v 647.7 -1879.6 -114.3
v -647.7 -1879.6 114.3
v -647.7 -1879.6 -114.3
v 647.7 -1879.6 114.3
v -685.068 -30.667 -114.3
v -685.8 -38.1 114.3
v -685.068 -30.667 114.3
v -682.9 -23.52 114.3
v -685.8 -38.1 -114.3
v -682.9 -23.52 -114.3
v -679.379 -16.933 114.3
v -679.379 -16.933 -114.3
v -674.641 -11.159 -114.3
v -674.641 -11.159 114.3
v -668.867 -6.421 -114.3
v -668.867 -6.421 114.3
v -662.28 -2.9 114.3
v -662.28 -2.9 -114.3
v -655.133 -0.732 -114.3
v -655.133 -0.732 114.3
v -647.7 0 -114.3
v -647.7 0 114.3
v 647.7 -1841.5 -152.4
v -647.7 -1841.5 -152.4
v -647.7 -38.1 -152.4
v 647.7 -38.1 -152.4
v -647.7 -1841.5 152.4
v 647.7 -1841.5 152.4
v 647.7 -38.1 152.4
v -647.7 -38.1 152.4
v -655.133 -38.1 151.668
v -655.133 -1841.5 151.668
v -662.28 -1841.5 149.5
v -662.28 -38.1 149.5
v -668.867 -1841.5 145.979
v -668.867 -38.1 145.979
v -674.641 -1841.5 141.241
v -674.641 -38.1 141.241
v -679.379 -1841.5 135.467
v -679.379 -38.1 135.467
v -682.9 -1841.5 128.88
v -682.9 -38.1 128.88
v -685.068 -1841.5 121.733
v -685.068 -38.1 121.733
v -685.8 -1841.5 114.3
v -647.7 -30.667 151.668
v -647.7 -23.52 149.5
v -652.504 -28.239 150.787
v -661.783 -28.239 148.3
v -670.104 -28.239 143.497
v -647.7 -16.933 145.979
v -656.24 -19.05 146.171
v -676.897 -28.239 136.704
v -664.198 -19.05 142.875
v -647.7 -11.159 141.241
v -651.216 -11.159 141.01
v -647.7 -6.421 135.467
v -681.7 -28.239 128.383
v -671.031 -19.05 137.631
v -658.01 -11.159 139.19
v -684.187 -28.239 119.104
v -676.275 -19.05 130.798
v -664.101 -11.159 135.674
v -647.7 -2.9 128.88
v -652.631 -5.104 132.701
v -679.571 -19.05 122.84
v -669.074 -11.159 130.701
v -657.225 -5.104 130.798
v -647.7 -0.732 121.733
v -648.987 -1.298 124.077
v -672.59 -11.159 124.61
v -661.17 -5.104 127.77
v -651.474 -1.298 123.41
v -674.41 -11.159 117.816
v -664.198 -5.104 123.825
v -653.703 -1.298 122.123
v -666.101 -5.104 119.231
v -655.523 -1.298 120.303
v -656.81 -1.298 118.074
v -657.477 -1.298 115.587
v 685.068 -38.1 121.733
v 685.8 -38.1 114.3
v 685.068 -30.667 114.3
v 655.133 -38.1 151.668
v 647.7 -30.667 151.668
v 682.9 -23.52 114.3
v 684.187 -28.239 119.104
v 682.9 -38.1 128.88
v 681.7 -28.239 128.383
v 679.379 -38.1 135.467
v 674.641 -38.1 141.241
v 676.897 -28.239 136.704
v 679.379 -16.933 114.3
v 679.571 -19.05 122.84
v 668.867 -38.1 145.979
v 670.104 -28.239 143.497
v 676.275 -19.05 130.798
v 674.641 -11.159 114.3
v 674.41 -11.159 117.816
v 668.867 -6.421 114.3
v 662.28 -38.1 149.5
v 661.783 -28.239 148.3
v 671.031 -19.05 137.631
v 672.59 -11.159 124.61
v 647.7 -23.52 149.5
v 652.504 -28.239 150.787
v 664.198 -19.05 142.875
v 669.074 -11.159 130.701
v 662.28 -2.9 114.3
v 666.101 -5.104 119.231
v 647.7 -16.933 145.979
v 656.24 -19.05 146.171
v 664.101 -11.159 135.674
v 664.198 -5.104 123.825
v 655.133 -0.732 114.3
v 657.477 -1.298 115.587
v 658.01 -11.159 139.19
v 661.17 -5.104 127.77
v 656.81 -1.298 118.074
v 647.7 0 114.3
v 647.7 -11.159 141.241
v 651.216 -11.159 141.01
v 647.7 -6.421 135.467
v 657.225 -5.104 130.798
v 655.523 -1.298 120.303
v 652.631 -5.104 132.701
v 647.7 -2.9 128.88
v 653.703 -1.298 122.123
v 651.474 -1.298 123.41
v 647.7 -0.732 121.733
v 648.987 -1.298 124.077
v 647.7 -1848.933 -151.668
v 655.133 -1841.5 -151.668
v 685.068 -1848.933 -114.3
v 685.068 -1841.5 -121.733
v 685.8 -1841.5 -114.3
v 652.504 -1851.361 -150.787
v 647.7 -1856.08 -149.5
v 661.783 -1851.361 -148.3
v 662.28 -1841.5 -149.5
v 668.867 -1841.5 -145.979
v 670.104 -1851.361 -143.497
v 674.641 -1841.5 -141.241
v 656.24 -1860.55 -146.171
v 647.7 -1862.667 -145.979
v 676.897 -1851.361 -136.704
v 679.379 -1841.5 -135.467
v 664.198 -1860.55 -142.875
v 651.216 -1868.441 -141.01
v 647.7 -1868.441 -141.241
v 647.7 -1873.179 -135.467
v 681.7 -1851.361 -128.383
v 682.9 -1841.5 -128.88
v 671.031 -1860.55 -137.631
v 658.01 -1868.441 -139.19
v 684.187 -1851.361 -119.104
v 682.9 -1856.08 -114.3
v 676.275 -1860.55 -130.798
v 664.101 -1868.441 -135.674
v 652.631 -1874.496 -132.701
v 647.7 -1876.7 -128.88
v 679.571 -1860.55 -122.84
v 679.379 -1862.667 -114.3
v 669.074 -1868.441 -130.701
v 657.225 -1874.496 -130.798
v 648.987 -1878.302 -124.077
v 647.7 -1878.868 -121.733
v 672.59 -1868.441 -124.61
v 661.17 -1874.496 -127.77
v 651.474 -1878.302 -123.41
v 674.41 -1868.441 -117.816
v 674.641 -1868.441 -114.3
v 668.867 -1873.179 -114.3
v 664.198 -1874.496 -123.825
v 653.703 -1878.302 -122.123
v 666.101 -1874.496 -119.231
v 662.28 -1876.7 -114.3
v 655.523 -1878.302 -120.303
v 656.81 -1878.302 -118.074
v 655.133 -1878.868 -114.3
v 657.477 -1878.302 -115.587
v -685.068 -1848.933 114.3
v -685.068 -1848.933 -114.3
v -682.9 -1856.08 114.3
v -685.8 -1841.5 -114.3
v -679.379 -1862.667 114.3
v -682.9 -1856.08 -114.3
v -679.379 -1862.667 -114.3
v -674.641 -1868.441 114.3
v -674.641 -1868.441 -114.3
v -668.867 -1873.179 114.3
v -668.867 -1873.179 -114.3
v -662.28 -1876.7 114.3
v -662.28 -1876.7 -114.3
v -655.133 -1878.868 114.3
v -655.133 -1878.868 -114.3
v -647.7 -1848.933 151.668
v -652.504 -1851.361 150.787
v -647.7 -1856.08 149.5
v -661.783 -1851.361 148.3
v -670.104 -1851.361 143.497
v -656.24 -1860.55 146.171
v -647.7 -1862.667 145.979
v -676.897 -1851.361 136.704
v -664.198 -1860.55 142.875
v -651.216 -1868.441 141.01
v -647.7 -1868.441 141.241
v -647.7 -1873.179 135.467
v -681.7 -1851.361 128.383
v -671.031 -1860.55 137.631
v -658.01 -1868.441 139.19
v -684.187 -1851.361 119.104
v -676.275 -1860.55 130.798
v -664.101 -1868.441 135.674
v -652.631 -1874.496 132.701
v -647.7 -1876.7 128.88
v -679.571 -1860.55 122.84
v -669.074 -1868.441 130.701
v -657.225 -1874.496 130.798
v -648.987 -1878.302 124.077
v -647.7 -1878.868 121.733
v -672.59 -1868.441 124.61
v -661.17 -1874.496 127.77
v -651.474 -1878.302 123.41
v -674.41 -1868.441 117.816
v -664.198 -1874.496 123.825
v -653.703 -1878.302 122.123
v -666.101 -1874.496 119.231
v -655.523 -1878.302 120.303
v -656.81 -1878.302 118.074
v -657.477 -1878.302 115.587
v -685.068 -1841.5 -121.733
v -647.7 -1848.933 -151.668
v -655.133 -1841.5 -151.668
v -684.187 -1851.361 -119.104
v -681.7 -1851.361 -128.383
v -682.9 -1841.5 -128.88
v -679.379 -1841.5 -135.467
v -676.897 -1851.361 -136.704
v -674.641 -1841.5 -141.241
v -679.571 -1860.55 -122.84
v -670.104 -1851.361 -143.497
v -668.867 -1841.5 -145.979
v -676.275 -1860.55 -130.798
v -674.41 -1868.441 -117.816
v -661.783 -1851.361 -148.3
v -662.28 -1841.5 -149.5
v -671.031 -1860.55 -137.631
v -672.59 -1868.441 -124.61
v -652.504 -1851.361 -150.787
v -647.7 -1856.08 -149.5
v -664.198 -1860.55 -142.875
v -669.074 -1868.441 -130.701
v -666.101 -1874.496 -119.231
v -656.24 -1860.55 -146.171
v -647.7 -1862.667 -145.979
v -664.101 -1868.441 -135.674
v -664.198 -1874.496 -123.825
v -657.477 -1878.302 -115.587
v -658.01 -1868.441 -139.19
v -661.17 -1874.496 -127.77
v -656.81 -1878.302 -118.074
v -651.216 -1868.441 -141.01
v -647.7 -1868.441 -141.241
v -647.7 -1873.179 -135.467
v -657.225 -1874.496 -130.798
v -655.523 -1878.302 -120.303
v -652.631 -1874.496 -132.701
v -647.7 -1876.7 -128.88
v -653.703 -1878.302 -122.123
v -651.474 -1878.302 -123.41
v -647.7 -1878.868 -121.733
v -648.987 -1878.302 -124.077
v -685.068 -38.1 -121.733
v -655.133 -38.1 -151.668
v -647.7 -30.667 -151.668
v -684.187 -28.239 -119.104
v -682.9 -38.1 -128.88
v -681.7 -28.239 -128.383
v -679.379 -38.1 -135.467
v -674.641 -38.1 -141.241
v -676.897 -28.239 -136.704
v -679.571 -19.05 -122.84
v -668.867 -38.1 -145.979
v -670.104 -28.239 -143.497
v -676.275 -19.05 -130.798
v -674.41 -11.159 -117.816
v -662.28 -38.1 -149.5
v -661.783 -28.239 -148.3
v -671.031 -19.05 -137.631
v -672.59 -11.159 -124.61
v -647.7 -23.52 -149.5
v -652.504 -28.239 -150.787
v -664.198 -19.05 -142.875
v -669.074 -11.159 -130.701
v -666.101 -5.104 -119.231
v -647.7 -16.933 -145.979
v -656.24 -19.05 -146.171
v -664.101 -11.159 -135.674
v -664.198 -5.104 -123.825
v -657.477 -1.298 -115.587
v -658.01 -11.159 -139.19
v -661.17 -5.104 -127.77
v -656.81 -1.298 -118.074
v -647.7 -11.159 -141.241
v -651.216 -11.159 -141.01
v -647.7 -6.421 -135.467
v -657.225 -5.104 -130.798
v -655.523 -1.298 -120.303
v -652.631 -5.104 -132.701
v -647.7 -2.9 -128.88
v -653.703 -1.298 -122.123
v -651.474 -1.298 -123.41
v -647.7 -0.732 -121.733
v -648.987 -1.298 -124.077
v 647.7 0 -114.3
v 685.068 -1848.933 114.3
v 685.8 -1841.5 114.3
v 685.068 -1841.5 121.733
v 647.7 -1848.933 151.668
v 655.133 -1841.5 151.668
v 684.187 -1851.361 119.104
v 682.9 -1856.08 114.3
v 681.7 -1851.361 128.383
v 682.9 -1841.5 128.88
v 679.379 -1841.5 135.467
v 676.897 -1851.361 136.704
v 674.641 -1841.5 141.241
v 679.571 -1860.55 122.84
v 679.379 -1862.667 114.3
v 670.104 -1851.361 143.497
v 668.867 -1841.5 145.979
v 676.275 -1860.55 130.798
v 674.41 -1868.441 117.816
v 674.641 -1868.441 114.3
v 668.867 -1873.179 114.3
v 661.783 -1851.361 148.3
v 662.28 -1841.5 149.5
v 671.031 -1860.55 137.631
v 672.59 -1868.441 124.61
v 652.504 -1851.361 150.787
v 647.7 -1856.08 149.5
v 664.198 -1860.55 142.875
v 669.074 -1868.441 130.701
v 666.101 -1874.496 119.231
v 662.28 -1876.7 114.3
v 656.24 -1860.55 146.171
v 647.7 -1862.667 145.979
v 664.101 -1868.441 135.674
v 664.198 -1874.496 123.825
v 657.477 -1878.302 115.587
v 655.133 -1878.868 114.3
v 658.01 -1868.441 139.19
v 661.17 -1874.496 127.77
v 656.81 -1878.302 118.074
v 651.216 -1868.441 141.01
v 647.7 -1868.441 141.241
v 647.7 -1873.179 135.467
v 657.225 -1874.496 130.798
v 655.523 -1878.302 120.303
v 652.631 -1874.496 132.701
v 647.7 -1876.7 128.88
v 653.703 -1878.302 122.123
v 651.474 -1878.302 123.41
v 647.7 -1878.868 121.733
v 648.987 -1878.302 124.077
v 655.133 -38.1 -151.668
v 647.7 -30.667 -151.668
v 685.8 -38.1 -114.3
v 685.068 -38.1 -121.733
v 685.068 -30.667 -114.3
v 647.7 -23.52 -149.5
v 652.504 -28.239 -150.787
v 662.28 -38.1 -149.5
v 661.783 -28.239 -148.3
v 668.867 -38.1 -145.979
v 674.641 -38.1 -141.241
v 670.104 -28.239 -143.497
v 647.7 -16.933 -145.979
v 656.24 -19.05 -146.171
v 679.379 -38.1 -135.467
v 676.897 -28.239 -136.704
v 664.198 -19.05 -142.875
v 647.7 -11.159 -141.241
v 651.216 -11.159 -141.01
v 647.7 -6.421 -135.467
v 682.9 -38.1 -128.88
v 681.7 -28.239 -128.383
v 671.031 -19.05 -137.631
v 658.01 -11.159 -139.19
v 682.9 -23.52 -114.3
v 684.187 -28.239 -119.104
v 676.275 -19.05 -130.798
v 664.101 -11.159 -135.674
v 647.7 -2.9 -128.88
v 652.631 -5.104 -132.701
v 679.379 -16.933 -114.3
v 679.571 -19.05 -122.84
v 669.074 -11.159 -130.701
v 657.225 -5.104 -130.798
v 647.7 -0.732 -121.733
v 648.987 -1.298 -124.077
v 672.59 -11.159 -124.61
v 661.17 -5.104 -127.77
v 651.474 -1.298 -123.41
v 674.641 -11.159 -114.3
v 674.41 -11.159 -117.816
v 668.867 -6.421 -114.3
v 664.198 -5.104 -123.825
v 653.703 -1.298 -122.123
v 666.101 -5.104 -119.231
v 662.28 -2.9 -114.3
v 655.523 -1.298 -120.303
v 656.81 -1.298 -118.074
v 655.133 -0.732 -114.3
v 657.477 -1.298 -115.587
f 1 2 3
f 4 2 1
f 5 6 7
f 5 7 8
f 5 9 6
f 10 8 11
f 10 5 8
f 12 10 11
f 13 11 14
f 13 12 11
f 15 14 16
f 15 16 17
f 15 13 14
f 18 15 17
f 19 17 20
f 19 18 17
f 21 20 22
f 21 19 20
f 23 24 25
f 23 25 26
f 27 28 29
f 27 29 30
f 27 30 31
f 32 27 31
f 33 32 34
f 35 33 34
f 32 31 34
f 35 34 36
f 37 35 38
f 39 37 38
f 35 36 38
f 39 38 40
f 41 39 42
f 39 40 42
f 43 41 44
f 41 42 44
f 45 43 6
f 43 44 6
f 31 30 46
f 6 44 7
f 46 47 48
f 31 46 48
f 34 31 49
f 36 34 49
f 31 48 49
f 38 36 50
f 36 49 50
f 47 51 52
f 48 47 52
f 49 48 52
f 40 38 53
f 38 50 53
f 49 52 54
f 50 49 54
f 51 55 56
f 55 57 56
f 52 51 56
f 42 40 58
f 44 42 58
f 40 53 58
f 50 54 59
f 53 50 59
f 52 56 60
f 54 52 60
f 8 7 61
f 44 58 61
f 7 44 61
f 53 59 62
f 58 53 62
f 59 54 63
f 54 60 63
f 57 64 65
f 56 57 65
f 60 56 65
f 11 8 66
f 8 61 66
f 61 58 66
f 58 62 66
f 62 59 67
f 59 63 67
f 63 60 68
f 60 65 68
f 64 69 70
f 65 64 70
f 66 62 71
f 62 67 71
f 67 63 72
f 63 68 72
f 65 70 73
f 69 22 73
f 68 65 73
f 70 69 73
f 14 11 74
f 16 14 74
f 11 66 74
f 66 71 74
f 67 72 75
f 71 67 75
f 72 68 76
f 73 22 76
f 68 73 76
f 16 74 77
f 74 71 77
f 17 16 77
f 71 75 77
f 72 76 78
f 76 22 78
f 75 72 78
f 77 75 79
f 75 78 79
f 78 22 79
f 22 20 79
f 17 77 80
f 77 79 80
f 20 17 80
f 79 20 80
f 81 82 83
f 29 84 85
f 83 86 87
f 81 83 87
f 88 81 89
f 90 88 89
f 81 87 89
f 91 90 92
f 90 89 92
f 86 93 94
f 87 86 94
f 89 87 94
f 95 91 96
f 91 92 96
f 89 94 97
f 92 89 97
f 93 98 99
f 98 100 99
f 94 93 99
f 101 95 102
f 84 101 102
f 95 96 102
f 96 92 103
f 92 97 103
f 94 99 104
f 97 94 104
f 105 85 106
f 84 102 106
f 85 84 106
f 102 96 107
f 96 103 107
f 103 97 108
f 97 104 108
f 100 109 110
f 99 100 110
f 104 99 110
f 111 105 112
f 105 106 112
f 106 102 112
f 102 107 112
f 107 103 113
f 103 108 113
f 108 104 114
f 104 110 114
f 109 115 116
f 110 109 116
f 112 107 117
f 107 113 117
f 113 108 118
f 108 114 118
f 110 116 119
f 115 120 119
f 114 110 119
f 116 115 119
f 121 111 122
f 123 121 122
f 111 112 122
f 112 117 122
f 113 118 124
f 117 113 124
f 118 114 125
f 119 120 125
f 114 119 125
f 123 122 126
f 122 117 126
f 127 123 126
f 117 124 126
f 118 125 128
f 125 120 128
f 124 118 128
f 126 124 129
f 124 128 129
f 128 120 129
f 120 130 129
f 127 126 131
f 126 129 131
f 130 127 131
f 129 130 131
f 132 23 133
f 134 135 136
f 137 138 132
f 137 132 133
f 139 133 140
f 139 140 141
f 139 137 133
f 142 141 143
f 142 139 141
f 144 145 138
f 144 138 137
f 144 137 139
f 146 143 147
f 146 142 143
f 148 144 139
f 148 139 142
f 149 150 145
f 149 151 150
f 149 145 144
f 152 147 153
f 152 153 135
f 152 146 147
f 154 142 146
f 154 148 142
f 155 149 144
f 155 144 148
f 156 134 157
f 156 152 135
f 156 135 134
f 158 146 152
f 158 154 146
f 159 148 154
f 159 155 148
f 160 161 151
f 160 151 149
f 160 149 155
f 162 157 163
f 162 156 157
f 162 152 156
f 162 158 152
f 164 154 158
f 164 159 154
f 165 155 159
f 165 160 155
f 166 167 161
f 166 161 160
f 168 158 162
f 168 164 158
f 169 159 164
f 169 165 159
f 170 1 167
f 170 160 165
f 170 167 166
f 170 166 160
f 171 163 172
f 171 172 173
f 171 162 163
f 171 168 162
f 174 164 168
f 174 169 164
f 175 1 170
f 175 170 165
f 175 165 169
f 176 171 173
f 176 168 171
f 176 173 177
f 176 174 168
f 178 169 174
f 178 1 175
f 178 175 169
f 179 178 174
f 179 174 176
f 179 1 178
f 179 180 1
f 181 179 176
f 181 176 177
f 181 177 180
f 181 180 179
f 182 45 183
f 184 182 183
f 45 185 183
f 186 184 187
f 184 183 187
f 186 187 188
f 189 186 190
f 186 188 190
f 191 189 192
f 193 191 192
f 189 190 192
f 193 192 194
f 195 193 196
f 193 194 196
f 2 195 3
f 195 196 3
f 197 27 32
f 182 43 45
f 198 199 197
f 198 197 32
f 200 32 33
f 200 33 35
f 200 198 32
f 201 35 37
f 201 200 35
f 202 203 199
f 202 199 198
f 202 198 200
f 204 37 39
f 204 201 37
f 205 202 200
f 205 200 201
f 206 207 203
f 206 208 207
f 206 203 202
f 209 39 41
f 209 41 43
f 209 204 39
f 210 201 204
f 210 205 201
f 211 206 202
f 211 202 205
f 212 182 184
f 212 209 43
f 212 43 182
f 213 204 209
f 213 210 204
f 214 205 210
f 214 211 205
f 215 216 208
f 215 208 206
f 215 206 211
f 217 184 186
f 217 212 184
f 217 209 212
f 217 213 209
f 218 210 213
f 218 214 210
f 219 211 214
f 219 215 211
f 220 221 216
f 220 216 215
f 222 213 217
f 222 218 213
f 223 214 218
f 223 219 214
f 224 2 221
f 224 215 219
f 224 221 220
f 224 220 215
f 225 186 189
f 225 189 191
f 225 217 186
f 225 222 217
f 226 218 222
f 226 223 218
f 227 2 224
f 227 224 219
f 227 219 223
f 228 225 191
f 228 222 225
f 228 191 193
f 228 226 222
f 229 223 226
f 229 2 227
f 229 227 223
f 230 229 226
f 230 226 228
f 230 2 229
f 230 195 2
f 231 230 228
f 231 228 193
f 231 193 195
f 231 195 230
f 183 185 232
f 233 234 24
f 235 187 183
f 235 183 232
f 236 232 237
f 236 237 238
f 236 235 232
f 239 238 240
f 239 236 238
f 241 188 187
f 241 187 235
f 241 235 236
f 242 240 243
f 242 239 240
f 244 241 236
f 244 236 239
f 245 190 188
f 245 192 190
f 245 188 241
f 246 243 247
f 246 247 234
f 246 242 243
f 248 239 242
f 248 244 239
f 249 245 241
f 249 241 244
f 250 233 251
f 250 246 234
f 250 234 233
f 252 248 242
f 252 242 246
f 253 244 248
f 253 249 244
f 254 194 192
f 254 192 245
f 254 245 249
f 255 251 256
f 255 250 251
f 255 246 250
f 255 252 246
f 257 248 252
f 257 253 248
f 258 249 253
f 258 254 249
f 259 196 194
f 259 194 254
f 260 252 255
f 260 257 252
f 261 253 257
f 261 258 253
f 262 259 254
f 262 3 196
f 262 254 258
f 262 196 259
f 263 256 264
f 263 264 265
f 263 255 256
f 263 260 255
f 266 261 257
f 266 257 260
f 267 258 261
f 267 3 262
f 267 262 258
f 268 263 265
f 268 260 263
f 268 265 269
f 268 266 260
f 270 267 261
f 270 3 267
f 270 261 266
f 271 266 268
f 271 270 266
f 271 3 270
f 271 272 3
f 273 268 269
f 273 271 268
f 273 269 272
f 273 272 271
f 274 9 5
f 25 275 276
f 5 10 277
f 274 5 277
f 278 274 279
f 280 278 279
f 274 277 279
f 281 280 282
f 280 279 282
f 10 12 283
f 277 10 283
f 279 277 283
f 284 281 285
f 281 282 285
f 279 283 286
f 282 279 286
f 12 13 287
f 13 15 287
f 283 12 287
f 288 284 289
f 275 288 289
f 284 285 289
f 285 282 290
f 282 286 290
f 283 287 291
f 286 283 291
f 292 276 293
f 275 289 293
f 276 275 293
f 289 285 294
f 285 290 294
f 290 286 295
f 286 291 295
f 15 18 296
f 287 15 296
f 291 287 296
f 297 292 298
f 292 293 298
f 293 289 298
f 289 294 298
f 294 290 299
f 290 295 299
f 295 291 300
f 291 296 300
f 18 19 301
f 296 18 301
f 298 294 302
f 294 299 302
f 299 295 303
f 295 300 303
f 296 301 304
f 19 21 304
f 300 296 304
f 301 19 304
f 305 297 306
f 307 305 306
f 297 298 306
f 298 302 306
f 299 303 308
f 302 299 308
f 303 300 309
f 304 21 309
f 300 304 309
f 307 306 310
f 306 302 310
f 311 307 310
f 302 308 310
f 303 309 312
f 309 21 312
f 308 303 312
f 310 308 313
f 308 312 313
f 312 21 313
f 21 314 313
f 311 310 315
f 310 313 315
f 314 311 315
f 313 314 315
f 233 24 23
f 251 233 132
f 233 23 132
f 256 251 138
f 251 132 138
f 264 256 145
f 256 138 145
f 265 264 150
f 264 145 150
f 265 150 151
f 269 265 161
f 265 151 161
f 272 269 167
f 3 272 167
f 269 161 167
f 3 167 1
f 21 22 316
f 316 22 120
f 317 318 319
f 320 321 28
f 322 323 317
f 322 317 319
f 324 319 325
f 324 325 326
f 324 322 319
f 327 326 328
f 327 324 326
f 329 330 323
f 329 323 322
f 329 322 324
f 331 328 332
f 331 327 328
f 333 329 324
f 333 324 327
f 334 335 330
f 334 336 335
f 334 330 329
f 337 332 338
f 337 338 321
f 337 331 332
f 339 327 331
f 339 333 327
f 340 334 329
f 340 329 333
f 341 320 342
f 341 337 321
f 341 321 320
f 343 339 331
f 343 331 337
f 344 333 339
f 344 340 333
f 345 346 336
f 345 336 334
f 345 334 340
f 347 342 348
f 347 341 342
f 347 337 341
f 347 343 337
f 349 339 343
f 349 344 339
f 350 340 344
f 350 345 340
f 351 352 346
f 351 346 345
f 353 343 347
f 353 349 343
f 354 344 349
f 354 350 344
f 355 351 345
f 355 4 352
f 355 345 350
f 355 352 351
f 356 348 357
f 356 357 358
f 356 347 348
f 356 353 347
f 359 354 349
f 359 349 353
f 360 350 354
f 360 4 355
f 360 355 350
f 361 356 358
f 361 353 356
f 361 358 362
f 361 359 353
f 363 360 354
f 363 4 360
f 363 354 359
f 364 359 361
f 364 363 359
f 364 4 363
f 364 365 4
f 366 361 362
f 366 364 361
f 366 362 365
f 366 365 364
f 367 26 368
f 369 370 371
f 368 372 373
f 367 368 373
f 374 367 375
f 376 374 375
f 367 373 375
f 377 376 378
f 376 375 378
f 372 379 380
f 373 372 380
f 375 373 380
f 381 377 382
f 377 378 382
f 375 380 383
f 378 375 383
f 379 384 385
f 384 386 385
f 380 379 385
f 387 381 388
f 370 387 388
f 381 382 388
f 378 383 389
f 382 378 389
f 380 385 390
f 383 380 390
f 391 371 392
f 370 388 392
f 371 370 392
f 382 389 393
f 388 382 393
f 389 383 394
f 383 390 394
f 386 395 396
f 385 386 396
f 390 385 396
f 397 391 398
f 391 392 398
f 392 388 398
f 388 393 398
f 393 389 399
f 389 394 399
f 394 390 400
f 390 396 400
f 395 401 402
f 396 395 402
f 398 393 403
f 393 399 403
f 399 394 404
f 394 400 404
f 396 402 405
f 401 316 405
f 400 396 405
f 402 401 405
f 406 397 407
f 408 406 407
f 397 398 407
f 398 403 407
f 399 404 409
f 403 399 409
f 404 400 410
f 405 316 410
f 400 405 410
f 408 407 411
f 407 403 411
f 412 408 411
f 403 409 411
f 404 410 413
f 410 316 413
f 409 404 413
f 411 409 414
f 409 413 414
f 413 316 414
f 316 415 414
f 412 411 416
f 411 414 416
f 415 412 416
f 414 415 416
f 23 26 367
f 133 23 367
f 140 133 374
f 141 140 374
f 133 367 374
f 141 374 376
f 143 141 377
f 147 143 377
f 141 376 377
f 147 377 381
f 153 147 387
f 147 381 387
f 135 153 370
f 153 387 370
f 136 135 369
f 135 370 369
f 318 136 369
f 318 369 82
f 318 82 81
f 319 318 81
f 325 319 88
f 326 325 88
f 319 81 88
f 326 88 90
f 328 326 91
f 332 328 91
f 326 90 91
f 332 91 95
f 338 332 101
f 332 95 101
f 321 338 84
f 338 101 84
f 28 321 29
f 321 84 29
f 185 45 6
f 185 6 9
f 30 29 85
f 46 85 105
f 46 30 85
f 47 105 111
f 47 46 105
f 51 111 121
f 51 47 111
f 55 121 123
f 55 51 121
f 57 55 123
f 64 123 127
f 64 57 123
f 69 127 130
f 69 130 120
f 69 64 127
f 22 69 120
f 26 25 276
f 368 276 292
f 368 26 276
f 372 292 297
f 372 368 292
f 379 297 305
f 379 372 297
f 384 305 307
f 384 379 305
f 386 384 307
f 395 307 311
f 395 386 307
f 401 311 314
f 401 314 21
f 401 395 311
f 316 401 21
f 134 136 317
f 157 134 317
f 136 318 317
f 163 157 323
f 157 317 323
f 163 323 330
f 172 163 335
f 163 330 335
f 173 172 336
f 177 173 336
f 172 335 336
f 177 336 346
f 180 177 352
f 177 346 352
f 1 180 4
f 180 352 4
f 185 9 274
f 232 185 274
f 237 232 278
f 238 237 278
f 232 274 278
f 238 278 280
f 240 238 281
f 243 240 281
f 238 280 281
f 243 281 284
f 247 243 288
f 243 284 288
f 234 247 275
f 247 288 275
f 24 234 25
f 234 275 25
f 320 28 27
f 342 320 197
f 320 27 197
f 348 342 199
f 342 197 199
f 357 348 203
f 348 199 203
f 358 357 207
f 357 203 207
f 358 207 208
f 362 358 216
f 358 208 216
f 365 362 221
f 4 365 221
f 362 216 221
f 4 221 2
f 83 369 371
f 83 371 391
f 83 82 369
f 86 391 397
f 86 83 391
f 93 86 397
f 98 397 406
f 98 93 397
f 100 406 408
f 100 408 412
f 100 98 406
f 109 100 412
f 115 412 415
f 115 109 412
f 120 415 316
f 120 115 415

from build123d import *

# Parameters (mm, degrees)
F1_DEPTH = 1879.6
F2_R     = 38.1


with BuildPart() as f1:
    # F0 (on Front) → F1 (new body)
    with BuildSketch(Plane.XZ):
        with BuildLine():
            Line((-647.7, -152.4), (647.7, -152.4))
            ThreePointArc((647.7, -152.4), (674.6407683632, -141.2407683632), (685.8, -114.3))
            Line((685.8, -114.3), (685.8, 114.3))
            ThreePointArc((685.8, 114.3), (674.6407683632, 141.2407683632), (647.7, 152.4))
            Line((647.7, 152.4), (-647.7, 152.4))
            ThreePointArc((-647.7, 152.4), (-674.6407683632, 141.2407683632), (-685.8, 114.3))
            Line((-685.8, 114.3), (-685.8, -114.3))
            ThreePointArc((-685.8, -114.3), (-674.6407683632, -141.2407683632), (-647.7, -152.4))
        make_face()
    extrude(amount=F1_DEPTH)

    # F2
    f2_edges = [f1.edges().sort_by_distance(p)[0] for p in [
        (685.8, -1879.6, 0),
        (647.7, -939.8, 152.4),
        (685.8, 0, 0),
    ]]
    fillet(f2_edges, radius=F2_R)


solid = f1.part
